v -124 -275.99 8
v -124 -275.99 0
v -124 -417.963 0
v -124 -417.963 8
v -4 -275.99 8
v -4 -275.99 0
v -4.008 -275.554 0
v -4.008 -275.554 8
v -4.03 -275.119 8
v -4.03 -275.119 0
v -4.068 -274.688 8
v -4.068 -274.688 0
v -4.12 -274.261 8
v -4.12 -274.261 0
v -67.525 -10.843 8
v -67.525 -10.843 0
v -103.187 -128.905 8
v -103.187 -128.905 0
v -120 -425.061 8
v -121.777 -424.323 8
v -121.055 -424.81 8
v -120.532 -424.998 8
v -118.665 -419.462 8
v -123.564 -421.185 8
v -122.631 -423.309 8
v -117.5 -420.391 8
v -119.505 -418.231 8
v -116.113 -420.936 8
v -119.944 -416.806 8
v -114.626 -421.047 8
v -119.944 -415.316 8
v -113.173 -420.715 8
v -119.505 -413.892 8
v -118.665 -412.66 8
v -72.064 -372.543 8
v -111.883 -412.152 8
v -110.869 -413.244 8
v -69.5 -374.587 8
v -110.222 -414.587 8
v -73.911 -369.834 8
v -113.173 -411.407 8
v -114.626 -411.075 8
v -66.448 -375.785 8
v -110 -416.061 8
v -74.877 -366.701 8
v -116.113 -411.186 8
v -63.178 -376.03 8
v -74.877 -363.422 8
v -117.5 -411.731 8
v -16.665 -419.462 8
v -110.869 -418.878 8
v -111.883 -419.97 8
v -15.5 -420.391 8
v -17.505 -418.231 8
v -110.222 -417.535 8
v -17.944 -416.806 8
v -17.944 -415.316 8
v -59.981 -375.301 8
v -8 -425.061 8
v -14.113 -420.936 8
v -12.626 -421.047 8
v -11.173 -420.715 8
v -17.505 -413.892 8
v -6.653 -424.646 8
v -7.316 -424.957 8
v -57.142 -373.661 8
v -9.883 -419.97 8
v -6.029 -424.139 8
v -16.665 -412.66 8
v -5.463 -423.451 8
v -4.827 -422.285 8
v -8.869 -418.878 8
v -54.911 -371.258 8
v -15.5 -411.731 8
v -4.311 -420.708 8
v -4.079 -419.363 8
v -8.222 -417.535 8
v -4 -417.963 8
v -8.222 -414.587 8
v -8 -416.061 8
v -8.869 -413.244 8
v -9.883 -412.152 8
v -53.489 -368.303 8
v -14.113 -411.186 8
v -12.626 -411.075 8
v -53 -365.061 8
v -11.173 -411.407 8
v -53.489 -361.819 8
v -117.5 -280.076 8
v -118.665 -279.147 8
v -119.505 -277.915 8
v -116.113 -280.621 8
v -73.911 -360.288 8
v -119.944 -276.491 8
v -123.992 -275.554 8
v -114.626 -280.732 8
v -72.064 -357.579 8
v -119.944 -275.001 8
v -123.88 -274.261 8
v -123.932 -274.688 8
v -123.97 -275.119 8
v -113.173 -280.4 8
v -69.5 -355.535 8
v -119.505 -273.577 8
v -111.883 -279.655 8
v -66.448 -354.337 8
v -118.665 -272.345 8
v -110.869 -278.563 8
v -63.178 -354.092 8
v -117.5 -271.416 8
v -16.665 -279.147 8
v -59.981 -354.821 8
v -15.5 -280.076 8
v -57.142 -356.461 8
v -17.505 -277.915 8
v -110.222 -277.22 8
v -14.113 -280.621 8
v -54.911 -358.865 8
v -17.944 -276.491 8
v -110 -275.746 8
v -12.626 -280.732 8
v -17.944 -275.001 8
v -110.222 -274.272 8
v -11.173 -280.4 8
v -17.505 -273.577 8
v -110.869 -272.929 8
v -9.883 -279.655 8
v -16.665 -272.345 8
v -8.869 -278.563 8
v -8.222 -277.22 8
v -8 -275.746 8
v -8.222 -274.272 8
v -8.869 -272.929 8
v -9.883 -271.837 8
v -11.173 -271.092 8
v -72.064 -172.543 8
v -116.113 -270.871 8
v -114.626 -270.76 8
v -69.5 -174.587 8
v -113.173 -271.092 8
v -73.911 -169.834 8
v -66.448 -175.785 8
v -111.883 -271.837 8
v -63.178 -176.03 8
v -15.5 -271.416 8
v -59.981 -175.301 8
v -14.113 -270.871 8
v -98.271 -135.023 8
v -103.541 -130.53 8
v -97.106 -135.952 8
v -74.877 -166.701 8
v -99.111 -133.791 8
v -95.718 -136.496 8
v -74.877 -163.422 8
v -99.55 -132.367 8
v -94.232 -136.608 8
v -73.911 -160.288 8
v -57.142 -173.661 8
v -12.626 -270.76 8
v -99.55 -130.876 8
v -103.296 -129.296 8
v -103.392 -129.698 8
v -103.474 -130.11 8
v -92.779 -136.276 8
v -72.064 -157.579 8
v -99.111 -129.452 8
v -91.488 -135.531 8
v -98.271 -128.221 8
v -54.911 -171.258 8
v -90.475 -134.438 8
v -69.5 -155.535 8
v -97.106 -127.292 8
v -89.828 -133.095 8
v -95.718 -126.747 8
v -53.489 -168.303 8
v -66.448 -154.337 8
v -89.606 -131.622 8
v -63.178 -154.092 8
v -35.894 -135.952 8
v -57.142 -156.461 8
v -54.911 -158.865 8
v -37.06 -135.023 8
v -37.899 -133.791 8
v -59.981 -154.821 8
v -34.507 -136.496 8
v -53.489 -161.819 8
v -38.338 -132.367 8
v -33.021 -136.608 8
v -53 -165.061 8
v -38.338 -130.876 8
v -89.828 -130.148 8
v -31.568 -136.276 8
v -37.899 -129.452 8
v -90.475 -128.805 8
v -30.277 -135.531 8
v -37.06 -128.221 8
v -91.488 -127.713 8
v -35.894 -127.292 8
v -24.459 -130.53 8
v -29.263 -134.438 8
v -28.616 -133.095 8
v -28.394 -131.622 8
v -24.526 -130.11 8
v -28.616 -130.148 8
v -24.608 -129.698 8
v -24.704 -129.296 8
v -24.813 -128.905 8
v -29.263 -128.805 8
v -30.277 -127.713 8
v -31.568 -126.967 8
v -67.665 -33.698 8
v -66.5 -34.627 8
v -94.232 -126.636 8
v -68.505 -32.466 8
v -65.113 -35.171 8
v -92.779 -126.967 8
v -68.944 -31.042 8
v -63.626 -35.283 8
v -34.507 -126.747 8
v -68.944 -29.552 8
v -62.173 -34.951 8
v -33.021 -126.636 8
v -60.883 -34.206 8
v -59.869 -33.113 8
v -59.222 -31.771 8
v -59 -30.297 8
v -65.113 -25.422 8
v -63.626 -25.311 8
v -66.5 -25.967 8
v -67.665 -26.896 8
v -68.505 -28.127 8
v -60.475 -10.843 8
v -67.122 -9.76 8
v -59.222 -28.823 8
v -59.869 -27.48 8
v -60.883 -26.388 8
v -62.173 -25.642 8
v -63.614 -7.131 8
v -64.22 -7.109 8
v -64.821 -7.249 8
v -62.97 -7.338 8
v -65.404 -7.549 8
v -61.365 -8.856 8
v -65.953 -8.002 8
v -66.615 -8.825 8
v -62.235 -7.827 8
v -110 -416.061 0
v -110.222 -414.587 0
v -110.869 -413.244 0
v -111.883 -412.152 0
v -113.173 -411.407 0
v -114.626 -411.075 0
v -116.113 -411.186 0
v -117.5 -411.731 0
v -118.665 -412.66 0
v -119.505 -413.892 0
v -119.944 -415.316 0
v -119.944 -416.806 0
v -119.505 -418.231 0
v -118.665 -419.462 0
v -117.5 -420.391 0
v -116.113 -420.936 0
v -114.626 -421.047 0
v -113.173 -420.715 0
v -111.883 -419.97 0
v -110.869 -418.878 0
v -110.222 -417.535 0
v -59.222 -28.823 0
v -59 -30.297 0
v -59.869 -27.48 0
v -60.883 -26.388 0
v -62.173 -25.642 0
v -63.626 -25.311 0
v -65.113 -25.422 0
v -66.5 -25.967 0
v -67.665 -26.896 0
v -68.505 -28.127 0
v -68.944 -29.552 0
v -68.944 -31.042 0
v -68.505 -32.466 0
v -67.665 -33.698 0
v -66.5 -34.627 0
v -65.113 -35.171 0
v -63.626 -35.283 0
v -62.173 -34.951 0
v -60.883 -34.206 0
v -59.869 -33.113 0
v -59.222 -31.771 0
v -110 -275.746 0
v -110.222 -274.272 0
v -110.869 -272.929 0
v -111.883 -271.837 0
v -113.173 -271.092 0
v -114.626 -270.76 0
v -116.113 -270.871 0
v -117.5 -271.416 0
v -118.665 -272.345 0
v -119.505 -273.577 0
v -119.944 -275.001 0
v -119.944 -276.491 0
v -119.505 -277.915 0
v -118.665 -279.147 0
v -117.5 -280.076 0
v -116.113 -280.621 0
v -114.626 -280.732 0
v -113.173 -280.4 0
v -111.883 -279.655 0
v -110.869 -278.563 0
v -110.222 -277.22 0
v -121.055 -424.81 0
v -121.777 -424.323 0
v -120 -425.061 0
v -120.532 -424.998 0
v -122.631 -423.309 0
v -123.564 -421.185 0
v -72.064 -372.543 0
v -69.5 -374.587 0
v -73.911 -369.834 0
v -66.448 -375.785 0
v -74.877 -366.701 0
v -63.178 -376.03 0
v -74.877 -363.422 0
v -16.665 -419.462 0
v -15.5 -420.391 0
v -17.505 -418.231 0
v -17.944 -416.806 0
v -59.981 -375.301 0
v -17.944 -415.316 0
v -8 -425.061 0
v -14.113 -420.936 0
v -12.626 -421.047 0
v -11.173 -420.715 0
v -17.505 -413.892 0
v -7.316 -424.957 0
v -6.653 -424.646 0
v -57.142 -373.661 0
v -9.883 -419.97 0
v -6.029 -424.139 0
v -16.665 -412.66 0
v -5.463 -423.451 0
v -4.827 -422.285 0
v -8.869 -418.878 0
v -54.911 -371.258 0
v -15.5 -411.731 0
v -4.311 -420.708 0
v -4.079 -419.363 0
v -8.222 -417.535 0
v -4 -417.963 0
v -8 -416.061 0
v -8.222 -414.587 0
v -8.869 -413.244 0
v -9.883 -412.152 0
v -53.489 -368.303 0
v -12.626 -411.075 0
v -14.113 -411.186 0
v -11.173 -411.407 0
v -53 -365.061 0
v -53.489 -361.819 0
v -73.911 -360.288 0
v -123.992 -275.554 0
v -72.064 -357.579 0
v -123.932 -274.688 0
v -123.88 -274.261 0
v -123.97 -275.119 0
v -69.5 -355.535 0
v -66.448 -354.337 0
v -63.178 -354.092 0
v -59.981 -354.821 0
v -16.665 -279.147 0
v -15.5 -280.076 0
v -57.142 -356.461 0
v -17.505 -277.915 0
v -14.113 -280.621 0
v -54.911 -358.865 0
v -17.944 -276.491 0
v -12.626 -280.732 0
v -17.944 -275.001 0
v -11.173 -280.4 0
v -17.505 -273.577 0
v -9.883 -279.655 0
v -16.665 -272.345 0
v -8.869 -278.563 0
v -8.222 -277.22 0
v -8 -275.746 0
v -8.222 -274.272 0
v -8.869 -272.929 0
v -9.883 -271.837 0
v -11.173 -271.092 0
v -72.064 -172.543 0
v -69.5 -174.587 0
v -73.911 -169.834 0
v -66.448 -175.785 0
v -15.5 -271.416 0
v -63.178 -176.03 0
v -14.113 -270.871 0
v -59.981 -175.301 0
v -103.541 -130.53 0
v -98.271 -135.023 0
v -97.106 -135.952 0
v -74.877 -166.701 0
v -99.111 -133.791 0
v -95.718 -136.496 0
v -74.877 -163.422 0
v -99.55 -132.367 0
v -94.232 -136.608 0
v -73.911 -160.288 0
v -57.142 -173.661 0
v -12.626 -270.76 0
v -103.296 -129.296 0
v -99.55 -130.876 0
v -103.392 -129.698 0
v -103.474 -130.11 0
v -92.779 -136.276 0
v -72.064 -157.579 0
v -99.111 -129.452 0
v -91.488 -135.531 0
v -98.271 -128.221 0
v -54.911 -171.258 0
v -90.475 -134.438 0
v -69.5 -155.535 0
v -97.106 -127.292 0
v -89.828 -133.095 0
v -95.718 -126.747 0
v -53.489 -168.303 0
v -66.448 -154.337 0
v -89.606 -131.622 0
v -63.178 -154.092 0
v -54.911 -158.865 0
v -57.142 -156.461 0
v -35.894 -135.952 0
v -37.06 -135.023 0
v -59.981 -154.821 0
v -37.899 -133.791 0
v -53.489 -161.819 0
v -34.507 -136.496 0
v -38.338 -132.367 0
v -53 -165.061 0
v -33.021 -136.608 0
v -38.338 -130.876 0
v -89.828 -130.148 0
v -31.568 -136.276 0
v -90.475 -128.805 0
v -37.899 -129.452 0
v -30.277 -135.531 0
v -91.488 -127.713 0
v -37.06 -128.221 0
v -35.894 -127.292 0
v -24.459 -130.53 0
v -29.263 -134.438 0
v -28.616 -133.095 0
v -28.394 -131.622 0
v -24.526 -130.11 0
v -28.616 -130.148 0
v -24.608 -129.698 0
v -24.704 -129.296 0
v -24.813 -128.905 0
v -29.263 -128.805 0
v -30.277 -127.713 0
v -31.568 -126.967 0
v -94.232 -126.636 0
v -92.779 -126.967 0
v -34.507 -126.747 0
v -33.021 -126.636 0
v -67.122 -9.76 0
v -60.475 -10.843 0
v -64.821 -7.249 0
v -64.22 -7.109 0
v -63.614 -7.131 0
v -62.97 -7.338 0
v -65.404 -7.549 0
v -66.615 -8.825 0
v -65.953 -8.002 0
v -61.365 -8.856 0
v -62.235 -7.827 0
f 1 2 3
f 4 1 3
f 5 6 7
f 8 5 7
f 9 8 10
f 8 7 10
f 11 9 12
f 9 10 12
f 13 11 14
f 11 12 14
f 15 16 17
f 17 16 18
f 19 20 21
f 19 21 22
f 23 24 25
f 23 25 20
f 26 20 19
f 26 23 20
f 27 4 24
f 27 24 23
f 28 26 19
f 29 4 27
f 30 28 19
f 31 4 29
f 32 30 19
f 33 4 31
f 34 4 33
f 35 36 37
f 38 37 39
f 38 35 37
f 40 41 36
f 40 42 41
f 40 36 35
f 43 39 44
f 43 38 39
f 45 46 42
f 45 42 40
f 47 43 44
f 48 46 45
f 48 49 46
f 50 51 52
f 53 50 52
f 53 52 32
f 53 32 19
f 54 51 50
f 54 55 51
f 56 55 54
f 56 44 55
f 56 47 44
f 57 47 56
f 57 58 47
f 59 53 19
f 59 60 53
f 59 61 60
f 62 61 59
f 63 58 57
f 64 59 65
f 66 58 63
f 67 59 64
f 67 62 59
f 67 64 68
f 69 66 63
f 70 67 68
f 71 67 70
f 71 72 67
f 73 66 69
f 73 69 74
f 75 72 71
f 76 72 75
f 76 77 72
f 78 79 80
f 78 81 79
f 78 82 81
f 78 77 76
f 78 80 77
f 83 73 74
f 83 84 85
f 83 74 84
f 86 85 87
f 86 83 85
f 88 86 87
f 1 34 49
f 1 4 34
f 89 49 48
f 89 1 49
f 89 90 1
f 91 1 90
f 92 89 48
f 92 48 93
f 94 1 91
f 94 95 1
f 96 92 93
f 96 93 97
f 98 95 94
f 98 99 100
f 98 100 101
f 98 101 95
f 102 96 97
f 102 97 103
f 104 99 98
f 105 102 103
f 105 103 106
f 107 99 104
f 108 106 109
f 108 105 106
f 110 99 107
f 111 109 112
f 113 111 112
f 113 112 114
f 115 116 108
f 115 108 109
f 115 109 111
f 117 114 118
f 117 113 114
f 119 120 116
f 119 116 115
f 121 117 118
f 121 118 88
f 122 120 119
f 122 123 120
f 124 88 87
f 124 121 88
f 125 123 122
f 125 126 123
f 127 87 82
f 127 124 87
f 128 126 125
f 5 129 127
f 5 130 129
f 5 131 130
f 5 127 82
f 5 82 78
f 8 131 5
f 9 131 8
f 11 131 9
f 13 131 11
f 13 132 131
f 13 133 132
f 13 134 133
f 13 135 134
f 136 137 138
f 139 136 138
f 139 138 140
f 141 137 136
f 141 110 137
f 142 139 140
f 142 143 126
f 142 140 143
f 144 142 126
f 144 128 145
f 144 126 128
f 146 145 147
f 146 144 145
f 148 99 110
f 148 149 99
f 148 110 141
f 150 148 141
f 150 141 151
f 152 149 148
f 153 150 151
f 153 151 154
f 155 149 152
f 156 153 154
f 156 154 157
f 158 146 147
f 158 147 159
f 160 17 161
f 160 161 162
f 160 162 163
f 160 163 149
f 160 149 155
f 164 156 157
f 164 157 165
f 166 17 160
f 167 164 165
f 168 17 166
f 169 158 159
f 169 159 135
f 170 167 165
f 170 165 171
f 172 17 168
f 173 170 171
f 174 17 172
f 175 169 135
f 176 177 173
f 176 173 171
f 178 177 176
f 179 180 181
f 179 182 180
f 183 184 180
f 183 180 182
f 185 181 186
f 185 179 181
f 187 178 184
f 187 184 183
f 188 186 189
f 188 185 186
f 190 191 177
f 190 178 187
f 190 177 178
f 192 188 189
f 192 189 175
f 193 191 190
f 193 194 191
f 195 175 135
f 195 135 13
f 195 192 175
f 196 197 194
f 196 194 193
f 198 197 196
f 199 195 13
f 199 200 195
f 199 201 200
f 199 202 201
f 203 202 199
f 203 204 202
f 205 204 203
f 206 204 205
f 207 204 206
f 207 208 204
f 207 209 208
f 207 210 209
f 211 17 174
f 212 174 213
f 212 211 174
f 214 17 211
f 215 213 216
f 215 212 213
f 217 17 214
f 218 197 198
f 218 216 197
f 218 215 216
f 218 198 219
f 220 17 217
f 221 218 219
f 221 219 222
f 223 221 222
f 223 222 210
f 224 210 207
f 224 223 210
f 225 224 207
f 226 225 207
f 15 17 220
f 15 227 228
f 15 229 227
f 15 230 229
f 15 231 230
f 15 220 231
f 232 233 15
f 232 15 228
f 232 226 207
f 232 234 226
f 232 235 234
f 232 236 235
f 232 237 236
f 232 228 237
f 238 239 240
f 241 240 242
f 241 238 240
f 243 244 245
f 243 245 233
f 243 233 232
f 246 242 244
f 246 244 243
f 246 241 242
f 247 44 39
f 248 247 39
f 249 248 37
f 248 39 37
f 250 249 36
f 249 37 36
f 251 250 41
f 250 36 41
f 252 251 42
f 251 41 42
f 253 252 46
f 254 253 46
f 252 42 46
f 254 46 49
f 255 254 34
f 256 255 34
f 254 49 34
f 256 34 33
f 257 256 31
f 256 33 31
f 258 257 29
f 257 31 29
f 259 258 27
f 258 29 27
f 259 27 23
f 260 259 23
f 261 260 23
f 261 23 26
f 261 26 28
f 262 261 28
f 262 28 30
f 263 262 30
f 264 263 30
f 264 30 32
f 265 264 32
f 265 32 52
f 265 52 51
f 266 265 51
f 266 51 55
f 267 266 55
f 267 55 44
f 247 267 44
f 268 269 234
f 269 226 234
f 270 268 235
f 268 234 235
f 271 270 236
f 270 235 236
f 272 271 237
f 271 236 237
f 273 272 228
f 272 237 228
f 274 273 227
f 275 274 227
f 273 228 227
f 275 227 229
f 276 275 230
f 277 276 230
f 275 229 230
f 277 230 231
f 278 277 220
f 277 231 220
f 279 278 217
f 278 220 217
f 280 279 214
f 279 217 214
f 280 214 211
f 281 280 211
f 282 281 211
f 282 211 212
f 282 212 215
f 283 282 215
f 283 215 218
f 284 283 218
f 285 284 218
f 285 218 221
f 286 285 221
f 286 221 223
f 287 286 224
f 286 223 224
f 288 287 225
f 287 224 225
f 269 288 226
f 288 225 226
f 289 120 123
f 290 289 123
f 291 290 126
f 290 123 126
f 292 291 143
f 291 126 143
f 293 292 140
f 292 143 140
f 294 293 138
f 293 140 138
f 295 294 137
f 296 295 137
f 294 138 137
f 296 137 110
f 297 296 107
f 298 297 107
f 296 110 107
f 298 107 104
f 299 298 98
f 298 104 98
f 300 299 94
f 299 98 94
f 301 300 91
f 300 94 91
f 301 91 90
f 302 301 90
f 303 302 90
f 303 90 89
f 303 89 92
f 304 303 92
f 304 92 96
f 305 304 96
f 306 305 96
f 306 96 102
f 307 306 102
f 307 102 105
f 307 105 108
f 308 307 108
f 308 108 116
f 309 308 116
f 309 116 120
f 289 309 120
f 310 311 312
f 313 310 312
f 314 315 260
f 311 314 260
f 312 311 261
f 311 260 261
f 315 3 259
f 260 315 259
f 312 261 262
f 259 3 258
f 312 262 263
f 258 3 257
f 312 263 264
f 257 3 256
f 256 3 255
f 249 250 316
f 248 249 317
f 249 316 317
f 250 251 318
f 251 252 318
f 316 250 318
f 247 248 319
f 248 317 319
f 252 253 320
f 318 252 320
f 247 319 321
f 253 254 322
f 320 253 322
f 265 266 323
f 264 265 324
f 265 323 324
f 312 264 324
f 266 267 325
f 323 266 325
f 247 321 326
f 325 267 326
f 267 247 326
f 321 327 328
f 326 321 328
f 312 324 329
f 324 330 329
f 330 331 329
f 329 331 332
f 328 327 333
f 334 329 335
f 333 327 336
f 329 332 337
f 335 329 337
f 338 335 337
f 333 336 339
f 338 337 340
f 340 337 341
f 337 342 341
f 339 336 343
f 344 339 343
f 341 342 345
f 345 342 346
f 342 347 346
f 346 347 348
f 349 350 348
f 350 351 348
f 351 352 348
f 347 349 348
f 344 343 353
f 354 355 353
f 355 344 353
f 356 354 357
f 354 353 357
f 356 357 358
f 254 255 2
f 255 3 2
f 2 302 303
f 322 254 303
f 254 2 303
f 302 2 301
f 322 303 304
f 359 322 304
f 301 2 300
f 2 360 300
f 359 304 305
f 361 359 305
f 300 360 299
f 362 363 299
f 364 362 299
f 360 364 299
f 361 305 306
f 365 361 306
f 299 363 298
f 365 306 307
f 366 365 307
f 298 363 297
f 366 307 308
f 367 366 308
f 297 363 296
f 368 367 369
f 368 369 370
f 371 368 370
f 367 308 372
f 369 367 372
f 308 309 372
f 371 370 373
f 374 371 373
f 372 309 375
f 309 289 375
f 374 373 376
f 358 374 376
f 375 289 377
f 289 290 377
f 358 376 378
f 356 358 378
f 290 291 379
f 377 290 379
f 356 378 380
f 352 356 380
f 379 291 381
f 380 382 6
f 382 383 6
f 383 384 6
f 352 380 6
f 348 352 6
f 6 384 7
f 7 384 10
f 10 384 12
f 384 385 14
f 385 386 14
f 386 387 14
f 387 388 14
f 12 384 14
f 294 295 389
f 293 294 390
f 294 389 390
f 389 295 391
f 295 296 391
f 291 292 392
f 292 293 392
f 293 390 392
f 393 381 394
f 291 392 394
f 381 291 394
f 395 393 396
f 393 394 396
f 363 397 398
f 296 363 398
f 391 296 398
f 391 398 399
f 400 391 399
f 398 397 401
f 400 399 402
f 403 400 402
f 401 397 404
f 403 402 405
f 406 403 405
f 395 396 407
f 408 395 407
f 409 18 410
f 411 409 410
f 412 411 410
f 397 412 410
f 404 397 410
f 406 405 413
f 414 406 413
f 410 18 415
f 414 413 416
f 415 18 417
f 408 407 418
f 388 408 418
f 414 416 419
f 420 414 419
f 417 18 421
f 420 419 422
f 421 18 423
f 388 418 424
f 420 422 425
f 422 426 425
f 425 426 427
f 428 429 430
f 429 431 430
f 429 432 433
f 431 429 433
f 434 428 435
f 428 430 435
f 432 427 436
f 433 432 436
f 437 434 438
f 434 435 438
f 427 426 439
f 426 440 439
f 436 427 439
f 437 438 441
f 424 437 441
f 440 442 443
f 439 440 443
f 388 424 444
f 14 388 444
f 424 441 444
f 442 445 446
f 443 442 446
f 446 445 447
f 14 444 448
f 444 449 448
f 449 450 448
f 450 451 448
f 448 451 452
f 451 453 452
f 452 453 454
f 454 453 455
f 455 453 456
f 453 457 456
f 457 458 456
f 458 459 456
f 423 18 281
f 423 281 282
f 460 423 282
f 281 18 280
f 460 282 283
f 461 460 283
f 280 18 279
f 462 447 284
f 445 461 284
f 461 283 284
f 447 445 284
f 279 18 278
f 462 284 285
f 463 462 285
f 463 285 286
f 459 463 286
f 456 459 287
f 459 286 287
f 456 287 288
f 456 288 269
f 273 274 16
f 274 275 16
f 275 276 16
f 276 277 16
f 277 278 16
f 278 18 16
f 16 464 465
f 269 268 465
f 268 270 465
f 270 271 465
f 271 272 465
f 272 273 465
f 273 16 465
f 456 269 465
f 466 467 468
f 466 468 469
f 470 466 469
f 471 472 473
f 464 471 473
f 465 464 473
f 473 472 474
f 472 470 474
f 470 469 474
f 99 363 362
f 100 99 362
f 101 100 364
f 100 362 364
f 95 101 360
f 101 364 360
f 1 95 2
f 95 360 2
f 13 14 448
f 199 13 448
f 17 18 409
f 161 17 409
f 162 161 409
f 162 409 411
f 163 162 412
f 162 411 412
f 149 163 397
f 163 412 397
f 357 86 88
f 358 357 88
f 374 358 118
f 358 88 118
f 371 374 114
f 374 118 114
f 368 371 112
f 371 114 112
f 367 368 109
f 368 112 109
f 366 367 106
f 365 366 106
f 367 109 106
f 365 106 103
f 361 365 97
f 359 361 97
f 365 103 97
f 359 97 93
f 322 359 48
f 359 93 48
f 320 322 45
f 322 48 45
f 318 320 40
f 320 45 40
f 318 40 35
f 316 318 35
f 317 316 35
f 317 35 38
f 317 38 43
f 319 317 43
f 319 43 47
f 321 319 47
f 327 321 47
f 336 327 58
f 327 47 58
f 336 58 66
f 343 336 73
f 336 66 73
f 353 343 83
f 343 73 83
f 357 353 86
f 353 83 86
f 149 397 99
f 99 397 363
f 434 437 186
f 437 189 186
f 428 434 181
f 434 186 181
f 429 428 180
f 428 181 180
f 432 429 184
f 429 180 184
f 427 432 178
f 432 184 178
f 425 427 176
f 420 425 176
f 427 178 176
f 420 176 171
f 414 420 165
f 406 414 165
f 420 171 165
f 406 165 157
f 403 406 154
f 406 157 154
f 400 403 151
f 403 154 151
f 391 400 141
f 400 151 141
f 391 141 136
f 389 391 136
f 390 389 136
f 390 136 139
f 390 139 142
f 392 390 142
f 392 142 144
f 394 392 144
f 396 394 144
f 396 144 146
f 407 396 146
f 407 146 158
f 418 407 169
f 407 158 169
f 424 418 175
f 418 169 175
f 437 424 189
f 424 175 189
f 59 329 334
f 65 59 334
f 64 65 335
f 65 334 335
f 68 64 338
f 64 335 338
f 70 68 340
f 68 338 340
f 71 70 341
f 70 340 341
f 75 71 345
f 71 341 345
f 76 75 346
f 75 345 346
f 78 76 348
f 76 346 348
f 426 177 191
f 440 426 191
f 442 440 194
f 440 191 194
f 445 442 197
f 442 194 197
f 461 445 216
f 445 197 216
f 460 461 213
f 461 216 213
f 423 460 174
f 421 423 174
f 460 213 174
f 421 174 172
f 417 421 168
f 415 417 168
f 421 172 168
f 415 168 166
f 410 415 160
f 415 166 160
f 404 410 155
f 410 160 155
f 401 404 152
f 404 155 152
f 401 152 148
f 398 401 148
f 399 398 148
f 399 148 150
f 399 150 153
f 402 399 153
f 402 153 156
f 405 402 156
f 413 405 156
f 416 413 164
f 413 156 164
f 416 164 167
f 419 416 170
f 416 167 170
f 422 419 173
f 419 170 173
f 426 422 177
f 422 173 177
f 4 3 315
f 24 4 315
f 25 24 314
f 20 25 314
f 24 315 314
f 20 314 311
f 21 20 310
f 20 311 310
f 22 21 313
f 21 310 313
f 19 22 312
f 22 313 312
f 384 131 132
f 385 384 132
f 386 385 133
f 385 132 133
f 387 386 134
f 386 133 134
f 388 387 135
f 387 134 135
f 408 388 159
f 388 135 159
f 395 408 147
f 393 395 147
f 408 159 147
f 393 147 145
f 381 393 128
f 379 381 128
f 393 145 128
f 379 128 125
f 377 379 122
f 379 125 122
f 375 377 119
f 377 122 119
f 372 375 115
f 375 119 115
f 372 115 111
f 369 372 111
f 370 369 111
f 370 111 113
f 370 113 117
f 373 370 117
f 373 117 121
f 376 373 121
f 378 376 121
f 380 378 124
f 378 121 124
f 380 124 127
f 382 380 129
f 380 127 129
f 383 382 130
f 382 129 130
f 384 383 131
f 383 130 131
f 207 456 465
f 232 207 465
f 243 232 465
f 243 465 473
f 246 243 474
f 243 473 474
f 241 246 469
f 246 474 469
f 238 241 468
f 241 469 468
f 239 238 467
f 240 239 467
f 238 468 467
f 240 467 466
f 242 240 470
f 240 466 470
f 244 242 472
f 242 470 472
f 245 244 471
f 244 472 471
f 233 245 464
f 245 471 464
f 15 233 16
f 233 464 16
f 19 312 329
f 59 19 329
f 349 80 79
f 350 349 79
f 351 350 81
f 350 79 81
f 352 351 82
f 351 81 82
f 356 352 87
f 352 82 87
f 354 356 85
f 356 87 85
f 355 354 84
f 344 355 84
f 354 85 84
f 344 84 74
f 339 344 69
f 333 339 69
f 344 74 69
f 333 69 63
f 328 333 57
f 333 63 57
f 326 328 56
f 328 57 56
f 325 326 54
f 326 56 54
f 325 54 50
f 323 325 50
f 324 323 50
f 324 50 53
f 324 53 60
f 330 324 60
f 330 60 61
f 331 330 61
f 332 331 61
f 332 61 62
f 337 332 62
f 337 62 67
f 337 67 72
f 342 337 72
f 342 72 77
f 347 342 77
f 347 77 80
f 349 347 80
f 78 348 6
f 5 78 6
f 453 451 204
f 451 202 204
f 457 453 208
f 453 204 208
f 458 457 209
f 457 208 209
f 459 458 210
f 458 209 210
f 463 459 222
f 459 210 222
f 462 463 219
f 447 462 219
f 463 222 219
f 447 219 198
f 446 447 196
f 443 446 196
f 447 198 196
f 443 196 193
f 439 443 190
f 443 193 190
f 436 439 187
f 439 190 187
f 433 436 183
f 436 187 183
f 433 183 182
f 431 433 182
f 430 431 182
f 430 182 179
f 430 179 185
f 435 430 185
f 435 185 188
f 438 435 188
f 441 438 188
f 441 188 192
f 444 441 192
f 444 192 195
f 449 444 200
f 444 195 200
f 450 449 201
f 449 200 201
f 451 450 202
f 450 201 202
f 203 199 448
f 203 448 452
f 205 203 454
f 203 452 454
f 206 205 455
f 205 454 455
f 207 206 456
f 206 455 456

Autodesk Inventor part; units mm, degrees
ref_plane "YZ Plane" through (0, 0, 0) normal (1, 0, 0) x (0, 1, 0)
ref_plane "XZ Plane" through (0, 0, 0) normal (0, 1, 0) x (-1, 0, 0)
ref_plane "Work Plane1" through (0, 0, 0) normal (0, 0, 1) x (1, 0, 0)
sketch "Sketch1" plane through (0, 0, 0) normal (0, 0, 1) x (1, 0, 0)
  line L0 (-65.5, -425.0611) -> (-65.5, -432.1593)
  line L1 (-120, -425.0611) -> (-65.5, -425.0611)
  ellipse E0 centre (-120, -417.963) end of major axis (-120, -425.0611) minor radius 4 (-124, -417.963) -> (-120, -425.0611) ccw
  line L2 (-124, -275.99) -> (-124, -417.963)
  ellipse E1 centre (-120, -275.99) end of major axis (-120, -268.8918) minor radius 4 (-123.8796, -274.2613) -> (-124, -275.99) ccw
  line L3 (-103.5409, -130.5299) -> (-123.8796, -274.2613)
  ellipse E2 centre (-99.6613, -132.2586) end of major axis (-99.6613, -125.1604) minor radius 4 (-103.1868, -128.9053) -> (-103.5409, -130.5299) ccw
  line L4 (-67.5255, -10.843) -> (-103.1868, -128.9053)
  ellipse E3 centre (-64, -14.1963) end of major axis (-64, -7.0982) minor radius 4 (-60.4745, -10.843) -> (-67.5255, -10.843) ccw
  line L5 (-24.8132, -128.9053) -> (-60.4745, -10.843)
  ellipse E4 centre (-28.3387, -132.2586) end of major axis (-28.3387, -125.1604) minor radius 4 (-24.4591, -130.5299) -> (-24.8132, -128.9053) ccw
  line L6 (-4.1204, -274.2613) -> (-24.4591, -130.5299)
  ellipse E5 centre (-8, -275.99) end of major axis (-8, -268.8918) minor radius 4 (-4, -275.99) -> (-4.1204, -274.2613) ccw
  line L7 (-4, -417.963) -> (-4, -275.99)
  ellipse E6 centre (-8, -417.963) end of major axis (-8, -425.0611) minor radius 4 (-8, -425.0611) -> (-4, -417.963) ccw
  line L8 (-62.5, -425.0611) -> (-8, -425.0611)
  line L9 (-62.5, -432.1593) -> (-62.5, -425.0611)
  line L10 (-8, -432.1593) -> (-62.5, -432.1593)
  ellipse E7 centre (-8, -417.963) end of major axis (-8, -432.1593) minor radius 8 (-8, -432.1593) -> (0, -417.963) ccw
  line L11 (0, -275.99) -> (0, -417.963)
  ellipse E8 centre (-8, -275.99) end of major axis (-8, -261.7937) minor radius 8 (0, -275.99) -> (-0.2409, -272.5326) ccw
  line L12 (-20.5796, -128.8012) -> (-0.2409, -272.5326)
  ellipse E9 centre (-28.3387, -132.2586) end of major axis (-28.3387, -118.0623) minor radius 8 (-20.5796, -128.8012) -> (-21.2877, -125.5519) ccw
  line L13 (-56.949, -7.4896) -> (-21.2877, -125.5519)
  ellipse E10 centre (-64, -14.1963) end of major axis (-64, 0) minor radius 8 (-56.949, -7.4896) -> (-71.051, -7.4896) ccw
  line L14 (-106.7123, -125.5519) -> (-71.051, -7.4896)
  ellipse E11 centre (-99.6613, -132.2586) end of major axis (-99.6613, -118.0623) minor radius 8 (-106.7123, -125.5519) -> (-107.4204, -128.8012) ccw
  line L15 (-127.7591, -272.5326) -> (-107.4204, -128.8012)
  ellipse E12 centre (-120, -275.99) end of major axis (-120, -261.7937) minor radius 8 (-127.7591, -272.5326) -> (-128, -275.99) ccw
  line L16 (-128, -417.963) -> (-128, -275.99)
  ellipse E13 centre (-120, -417.963) end of major axis (-120, -432.1593) minor radius 8 (-128, -417.963) -> (-120, -432.1593) ccw
  line L17 (-65.5, -432.1593) -> (-120, -432.1593)
  line L18 (-62.5, -425.0611) -> (-65.5, -425.0611)
  point P0 (0, 0)
extrude "Plate1" add sketch "Sketch1" along normal blind 8 contours L1 E0 L2 E1 L3 E2 L4 E3 L5 E4 L6 E5 L7 E6 L8 L18
sketch "Sketch2" plane through (0, 0, 8) normal (0, 0, 1) x (1, 0, 0)
  line L0 (-8, -425.0611) -> (-120, -425.0611) projected
  ellipse E0 centre (-8, -417.963) end of major axis (-8, -425.0611) minor radius 4 (-8, -425.0611) -> (-4, -417.963) ccw projected
  line L1 (-4, -275.99) -> (-4, -417.963) projected
  ellipse E1 centre (-8, -275.99) end of major axis (-8, -268.8918) minor radius 4 (-4, -275.99) -> (-4.1204, -274.2613) ccw projected
  line L2 (-24.4591, -130.5299) -> (-4.1204, -274.2613) projected
  ellipse E2 centre (-28.3387, -132.2586) end of major axis (-28.3387, -125.1604) minor radius 4 (-24.4591, -130.5299) -> (-24.8132, -128.9053) ccw projected
  line L3 (-60.4745, -10.843) -> (-24.8132, -128.9053) projected
  ellipse E3 centre (-64, -14.1963) end of major axis (-64, -7.0982) minor radius 4 (-60.4745, -10.843) -> (-67.5255, -10.843) ccw projected
  line L4 (-103.1868, -128.9053) -> (-67.5255, -10.843) projected
  ellipse E4 centre (-99.6613, -132.2586) end of major axis (-99.6613, -125.1604) minor radius 4 (-103.1868, -128.9053) -> (-103.5409, -130.5299) ccw projected
  line L5 (-123.8796, -274.2613) -> (-103.5409, -130.5299) projected
  ellipse E5 centre (-120, -275.99) end of major axis (-120, -268.8918) minor radius 4 (-123.8796, -274.2613) -> (-124, -275.99) ccw projected
  line L6 (-124, -417.963) -> (-124, -275.99) projected
  ellipse E6 centre (-120, -417.963) end of major axis (-120, -425.0611) minor radius 4 (-124, -417.963) -> (-120, -425.0611) ccw projected
  line L7 (-64, -470.7435) -> (-64, 33.682) construction
  line L8 (-8, -425.0611) -> (-120, -425.0611) construction
  circle A0 centre (-64, -365.0611) radius 11
  circle A1 centre (-64, -165.0611) radius 11
  circle A2 centre (-115, -416.0611) radius 5
  circle A3 centre (-115, -275.746) radius 5
  circle A4 centre (-94.6057, -131.6217) radius 5
  circle A5 centre (-64, -30.2968) radius 5
  circle A6 centre (-33.3943, -131.6217) radius 5
  circle A7 centre (-13, -275.746) radius 5
  circle A8 centre (-13, -416.0611) radius 5
  point P0 (0, 0)
  dimension "d1" = 22
  dimension "d2" = 22
  dimension "d3" = 10
  dimension "d4" = 10
  dimension "d5" = 10
  dimension "d7" = 10
  dimension "d9" = 10
  dimension "d11" = 10
  dimension "d13" = 10
  dimension "d15" = 9
  dimension "d16" = 9
  dimension "d17" = 4
  dimension "d18" = 9
  dimension "d19" = 9
  dimension "d20" = 9
  dimension "d21" = 9
  dimension "d22" = 9
  dimension "d23" = 9
  dimension "d24" = 9
  dimension "d25" = 9
  dimension "d26" = 9
  dimension "d27" = 9
  dimension "d28" = 9
  dimension "d29" = 9
  dimension "d30" = 60
  dimension "d31" = 60
  dimension "d33" = 200
extrude "zinkdrænshuller" cut sketch "Sketch2" against normal blind 8 contours A0 | A1 | A2 | A3 | A4 | A5 | A6 | A7 | A8
equation "\"d2\" = d1"
equation "\"d4\" = d3"
equation "\"d5\" = d6"
equation "\"d7\" = d8"
equation "\"d9\" = d10"
equation "\"d11\" = d12"
equation "\"d13\" = d14"
equation "\"d16\" = d15"
equation "\"d18\" = d16"
equation "\"d19\" = d16"
equation "\"d20\" = d16"
equation "\"d21\" = d16"
equation "\"d22\" = d16"
equation "\"d23\" = d16"
equation "\"d24\" = d16"
equation "\"d25\" = d16"
equation "\"d26\" = d16"
equation "\"d27\" = d16"
equation "\"d28\" = d16"
equation "\"d29\" = d16"
equation "\"d31\" = d30"
equation "\"d34\" = Thickness"
equation "\"d0\" = Thickness"
equation "\"BendRadius\" = Thickness"
equation "\"BendReliefWidth\" = Thickness"
equation "\"BendReliefDepth\" = 0.5 * Thickness"
equation "\"CornerReliefSize\" = 4 * Thickness"
equation "\"MinimumRemnant\" = 2 * Thickness"
equation "\"TransitionRadius\" = BendRadius"
equation "\"JacobiRadiusSize\" = BendRadius"
equation "\"GapSize\" = Thickness"
equation "\"d6\" = 10"
equation "\"d8\" = 10"
equation "\"d10\" = 10"
equation "\"d12\" = 10"
equation "\"d14\" = 10"
equation "\"Thickness\" = 8"
properties part number "bund vange-endeplade" material "S235JR"
